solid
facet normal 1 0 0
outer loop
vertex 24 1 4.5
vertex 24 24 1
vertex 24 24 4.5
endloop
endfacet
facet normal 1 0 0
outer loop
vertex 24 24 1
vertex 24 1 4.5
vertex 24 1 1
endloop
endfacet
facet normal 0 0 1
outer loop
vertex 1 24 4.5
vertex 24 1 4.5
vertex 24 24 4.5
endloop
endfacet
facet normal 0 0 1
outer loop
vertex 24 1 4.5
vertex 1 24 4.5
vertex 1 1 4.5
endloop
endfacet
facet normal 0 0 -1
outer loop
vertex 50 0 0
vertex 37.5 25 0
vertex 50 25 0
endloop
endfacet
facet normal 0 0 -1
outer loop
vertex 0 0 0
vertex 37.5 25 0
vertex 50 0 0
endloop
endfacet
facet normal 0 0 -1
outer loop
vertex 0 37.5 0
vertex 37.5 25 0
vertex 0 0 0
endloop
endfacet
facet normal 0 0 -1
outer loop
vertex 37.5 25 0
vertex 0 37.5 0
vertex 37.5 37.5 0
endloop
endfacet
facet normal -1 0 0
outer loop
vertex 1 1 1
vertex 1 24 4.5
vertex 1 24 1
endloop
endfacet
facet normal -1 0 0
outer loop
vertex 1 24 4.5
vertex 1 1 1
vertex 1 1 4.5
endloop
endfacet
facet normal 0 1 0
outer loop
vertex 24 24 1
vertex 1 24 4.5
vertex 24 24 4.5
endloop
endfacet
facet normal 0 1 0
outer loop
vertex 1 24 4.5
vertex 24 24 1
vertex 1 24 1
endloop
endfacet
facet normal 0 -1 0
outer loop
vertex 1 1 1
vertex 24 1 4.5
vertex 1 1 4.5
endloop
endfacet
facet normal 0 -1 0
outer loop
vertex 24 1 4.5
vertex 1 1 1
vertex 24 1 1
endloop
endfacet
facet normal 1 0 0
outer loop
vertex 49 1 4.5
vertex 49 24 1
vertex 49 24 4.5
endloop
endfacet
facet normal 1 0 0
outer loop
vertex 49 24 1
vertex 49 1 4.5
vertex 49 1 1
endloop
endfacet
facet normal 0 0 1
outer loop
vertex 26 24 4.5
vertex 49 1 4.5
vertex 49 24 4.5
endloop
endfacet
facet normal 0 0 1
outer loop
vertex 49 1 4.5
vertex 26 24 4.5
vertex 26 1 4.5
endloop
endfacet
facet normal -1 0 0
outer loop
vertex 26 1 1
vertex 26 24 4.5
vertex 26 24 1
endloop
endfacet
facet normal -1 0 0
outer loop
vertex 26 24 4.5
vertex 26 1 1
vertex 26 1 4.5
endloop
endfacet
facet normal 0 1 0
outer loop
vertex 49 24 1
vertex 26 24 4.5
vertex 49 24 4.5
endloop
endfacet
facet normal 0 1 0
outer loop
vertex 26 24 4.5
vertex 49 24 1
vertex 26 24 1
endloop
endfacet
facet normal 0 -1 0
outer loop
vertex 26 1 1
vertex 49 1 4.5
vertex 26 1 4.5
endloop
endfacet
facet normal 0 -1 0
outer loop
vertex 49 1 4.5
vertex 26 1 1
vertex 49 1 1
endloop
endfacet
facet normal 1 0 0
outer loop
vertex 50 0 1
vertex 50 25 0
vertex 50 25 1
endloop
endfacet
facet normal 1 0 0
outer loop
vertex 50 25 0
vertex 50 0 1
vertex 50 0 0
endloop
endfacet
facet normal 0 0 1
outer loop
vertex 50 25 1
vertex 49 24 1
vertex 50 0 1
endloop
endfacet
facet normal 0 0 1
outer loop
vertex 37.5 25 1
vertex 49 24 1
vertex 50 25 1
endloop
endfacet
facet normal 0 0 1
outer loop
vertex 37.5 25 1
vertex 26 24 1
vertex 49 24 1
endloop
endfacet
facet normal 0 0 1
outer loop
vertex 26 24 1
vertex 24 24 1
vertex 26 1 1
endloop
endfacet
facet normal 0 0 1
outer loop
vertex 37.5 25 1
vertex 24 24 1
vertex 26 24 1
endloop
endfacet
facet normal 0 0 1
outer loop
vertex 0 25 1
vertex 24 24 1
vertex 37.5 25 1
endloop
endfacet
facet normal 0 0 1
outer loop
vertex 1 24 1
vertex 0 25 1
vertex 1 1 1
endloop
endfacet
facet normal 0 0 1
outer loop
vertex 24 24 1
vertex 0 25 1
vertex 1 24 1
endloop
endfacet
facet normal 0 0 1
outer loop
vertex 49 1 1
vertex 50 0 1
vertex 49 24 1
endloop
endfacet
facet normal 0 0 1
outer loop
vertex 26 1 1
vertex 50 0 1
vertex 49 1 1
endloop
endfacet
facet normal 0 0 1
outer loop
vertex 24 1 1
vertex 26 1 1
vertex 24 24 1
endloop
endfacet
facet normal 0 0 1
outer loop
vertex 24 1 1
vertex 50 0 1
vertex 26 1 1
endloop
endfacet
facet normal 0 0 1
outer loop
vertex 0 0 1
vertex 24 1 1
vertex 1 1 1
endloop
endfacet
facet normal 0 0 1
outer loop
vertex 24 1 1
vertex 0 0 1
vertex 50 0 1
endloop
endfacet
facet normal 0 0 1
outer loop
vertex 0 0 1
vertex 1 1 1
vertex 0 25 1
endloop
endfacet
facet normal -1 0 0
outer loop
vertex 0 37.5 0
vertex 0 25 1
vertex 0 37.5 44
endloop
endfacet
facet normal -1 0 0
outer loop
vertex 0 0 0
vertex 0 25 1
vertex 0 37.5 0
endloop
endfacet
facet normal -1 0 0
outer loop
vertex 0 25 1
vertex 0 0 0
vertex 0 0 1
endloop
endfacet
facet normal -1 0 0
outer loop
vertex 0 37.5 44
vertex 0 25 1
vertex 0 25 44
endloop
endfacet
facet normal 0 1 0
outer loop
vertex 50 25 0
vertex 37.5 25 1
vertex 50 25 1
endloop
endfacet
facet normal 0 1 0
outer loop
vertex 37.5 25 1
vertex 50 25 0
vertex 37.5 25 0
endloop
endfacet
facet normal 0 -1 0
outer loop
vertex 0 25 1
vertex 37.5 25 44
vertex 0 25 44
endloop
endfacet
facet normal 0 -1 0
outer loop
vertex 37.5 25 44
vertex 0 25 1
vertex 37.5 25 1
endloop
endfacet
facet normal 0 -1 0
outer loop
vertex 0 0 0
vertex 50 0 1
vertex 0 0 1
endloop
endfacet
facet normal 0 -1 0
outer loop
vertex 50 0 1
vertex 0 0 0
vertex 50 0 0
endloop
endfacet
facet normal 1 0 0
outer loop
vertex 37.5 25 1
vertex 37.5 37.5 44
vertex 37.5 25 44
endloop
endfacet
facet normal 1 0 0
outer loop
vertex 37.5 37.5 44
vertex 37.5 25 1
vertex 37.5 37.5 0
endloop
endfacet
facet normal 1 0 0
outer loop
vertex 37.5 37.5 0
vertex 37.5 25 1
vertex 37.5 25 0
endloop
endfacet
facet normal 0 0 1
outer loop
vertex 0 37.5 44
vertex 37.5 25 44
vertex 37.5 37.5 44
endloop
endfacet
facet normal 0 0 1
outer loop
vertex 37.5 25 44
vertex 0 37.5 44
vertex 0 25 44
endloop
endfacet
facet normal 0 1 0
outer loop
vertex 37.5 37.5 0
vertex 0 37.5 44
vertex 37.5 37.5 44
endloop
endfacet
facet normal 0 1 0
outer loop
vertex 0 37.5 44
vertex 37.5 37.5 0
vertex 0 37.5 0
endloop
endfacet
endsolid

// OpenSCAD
color("LightGray") {
    translate([1,1,0]) cube([23,23,4.5]);
    translate([25+1,1,0]) cube([23,23,4.5]);
}
color("Grey") {
    cube([50,25,1]);
    translate([0,25,0]) cube([50-12.5,12.5,50-6]);
}
